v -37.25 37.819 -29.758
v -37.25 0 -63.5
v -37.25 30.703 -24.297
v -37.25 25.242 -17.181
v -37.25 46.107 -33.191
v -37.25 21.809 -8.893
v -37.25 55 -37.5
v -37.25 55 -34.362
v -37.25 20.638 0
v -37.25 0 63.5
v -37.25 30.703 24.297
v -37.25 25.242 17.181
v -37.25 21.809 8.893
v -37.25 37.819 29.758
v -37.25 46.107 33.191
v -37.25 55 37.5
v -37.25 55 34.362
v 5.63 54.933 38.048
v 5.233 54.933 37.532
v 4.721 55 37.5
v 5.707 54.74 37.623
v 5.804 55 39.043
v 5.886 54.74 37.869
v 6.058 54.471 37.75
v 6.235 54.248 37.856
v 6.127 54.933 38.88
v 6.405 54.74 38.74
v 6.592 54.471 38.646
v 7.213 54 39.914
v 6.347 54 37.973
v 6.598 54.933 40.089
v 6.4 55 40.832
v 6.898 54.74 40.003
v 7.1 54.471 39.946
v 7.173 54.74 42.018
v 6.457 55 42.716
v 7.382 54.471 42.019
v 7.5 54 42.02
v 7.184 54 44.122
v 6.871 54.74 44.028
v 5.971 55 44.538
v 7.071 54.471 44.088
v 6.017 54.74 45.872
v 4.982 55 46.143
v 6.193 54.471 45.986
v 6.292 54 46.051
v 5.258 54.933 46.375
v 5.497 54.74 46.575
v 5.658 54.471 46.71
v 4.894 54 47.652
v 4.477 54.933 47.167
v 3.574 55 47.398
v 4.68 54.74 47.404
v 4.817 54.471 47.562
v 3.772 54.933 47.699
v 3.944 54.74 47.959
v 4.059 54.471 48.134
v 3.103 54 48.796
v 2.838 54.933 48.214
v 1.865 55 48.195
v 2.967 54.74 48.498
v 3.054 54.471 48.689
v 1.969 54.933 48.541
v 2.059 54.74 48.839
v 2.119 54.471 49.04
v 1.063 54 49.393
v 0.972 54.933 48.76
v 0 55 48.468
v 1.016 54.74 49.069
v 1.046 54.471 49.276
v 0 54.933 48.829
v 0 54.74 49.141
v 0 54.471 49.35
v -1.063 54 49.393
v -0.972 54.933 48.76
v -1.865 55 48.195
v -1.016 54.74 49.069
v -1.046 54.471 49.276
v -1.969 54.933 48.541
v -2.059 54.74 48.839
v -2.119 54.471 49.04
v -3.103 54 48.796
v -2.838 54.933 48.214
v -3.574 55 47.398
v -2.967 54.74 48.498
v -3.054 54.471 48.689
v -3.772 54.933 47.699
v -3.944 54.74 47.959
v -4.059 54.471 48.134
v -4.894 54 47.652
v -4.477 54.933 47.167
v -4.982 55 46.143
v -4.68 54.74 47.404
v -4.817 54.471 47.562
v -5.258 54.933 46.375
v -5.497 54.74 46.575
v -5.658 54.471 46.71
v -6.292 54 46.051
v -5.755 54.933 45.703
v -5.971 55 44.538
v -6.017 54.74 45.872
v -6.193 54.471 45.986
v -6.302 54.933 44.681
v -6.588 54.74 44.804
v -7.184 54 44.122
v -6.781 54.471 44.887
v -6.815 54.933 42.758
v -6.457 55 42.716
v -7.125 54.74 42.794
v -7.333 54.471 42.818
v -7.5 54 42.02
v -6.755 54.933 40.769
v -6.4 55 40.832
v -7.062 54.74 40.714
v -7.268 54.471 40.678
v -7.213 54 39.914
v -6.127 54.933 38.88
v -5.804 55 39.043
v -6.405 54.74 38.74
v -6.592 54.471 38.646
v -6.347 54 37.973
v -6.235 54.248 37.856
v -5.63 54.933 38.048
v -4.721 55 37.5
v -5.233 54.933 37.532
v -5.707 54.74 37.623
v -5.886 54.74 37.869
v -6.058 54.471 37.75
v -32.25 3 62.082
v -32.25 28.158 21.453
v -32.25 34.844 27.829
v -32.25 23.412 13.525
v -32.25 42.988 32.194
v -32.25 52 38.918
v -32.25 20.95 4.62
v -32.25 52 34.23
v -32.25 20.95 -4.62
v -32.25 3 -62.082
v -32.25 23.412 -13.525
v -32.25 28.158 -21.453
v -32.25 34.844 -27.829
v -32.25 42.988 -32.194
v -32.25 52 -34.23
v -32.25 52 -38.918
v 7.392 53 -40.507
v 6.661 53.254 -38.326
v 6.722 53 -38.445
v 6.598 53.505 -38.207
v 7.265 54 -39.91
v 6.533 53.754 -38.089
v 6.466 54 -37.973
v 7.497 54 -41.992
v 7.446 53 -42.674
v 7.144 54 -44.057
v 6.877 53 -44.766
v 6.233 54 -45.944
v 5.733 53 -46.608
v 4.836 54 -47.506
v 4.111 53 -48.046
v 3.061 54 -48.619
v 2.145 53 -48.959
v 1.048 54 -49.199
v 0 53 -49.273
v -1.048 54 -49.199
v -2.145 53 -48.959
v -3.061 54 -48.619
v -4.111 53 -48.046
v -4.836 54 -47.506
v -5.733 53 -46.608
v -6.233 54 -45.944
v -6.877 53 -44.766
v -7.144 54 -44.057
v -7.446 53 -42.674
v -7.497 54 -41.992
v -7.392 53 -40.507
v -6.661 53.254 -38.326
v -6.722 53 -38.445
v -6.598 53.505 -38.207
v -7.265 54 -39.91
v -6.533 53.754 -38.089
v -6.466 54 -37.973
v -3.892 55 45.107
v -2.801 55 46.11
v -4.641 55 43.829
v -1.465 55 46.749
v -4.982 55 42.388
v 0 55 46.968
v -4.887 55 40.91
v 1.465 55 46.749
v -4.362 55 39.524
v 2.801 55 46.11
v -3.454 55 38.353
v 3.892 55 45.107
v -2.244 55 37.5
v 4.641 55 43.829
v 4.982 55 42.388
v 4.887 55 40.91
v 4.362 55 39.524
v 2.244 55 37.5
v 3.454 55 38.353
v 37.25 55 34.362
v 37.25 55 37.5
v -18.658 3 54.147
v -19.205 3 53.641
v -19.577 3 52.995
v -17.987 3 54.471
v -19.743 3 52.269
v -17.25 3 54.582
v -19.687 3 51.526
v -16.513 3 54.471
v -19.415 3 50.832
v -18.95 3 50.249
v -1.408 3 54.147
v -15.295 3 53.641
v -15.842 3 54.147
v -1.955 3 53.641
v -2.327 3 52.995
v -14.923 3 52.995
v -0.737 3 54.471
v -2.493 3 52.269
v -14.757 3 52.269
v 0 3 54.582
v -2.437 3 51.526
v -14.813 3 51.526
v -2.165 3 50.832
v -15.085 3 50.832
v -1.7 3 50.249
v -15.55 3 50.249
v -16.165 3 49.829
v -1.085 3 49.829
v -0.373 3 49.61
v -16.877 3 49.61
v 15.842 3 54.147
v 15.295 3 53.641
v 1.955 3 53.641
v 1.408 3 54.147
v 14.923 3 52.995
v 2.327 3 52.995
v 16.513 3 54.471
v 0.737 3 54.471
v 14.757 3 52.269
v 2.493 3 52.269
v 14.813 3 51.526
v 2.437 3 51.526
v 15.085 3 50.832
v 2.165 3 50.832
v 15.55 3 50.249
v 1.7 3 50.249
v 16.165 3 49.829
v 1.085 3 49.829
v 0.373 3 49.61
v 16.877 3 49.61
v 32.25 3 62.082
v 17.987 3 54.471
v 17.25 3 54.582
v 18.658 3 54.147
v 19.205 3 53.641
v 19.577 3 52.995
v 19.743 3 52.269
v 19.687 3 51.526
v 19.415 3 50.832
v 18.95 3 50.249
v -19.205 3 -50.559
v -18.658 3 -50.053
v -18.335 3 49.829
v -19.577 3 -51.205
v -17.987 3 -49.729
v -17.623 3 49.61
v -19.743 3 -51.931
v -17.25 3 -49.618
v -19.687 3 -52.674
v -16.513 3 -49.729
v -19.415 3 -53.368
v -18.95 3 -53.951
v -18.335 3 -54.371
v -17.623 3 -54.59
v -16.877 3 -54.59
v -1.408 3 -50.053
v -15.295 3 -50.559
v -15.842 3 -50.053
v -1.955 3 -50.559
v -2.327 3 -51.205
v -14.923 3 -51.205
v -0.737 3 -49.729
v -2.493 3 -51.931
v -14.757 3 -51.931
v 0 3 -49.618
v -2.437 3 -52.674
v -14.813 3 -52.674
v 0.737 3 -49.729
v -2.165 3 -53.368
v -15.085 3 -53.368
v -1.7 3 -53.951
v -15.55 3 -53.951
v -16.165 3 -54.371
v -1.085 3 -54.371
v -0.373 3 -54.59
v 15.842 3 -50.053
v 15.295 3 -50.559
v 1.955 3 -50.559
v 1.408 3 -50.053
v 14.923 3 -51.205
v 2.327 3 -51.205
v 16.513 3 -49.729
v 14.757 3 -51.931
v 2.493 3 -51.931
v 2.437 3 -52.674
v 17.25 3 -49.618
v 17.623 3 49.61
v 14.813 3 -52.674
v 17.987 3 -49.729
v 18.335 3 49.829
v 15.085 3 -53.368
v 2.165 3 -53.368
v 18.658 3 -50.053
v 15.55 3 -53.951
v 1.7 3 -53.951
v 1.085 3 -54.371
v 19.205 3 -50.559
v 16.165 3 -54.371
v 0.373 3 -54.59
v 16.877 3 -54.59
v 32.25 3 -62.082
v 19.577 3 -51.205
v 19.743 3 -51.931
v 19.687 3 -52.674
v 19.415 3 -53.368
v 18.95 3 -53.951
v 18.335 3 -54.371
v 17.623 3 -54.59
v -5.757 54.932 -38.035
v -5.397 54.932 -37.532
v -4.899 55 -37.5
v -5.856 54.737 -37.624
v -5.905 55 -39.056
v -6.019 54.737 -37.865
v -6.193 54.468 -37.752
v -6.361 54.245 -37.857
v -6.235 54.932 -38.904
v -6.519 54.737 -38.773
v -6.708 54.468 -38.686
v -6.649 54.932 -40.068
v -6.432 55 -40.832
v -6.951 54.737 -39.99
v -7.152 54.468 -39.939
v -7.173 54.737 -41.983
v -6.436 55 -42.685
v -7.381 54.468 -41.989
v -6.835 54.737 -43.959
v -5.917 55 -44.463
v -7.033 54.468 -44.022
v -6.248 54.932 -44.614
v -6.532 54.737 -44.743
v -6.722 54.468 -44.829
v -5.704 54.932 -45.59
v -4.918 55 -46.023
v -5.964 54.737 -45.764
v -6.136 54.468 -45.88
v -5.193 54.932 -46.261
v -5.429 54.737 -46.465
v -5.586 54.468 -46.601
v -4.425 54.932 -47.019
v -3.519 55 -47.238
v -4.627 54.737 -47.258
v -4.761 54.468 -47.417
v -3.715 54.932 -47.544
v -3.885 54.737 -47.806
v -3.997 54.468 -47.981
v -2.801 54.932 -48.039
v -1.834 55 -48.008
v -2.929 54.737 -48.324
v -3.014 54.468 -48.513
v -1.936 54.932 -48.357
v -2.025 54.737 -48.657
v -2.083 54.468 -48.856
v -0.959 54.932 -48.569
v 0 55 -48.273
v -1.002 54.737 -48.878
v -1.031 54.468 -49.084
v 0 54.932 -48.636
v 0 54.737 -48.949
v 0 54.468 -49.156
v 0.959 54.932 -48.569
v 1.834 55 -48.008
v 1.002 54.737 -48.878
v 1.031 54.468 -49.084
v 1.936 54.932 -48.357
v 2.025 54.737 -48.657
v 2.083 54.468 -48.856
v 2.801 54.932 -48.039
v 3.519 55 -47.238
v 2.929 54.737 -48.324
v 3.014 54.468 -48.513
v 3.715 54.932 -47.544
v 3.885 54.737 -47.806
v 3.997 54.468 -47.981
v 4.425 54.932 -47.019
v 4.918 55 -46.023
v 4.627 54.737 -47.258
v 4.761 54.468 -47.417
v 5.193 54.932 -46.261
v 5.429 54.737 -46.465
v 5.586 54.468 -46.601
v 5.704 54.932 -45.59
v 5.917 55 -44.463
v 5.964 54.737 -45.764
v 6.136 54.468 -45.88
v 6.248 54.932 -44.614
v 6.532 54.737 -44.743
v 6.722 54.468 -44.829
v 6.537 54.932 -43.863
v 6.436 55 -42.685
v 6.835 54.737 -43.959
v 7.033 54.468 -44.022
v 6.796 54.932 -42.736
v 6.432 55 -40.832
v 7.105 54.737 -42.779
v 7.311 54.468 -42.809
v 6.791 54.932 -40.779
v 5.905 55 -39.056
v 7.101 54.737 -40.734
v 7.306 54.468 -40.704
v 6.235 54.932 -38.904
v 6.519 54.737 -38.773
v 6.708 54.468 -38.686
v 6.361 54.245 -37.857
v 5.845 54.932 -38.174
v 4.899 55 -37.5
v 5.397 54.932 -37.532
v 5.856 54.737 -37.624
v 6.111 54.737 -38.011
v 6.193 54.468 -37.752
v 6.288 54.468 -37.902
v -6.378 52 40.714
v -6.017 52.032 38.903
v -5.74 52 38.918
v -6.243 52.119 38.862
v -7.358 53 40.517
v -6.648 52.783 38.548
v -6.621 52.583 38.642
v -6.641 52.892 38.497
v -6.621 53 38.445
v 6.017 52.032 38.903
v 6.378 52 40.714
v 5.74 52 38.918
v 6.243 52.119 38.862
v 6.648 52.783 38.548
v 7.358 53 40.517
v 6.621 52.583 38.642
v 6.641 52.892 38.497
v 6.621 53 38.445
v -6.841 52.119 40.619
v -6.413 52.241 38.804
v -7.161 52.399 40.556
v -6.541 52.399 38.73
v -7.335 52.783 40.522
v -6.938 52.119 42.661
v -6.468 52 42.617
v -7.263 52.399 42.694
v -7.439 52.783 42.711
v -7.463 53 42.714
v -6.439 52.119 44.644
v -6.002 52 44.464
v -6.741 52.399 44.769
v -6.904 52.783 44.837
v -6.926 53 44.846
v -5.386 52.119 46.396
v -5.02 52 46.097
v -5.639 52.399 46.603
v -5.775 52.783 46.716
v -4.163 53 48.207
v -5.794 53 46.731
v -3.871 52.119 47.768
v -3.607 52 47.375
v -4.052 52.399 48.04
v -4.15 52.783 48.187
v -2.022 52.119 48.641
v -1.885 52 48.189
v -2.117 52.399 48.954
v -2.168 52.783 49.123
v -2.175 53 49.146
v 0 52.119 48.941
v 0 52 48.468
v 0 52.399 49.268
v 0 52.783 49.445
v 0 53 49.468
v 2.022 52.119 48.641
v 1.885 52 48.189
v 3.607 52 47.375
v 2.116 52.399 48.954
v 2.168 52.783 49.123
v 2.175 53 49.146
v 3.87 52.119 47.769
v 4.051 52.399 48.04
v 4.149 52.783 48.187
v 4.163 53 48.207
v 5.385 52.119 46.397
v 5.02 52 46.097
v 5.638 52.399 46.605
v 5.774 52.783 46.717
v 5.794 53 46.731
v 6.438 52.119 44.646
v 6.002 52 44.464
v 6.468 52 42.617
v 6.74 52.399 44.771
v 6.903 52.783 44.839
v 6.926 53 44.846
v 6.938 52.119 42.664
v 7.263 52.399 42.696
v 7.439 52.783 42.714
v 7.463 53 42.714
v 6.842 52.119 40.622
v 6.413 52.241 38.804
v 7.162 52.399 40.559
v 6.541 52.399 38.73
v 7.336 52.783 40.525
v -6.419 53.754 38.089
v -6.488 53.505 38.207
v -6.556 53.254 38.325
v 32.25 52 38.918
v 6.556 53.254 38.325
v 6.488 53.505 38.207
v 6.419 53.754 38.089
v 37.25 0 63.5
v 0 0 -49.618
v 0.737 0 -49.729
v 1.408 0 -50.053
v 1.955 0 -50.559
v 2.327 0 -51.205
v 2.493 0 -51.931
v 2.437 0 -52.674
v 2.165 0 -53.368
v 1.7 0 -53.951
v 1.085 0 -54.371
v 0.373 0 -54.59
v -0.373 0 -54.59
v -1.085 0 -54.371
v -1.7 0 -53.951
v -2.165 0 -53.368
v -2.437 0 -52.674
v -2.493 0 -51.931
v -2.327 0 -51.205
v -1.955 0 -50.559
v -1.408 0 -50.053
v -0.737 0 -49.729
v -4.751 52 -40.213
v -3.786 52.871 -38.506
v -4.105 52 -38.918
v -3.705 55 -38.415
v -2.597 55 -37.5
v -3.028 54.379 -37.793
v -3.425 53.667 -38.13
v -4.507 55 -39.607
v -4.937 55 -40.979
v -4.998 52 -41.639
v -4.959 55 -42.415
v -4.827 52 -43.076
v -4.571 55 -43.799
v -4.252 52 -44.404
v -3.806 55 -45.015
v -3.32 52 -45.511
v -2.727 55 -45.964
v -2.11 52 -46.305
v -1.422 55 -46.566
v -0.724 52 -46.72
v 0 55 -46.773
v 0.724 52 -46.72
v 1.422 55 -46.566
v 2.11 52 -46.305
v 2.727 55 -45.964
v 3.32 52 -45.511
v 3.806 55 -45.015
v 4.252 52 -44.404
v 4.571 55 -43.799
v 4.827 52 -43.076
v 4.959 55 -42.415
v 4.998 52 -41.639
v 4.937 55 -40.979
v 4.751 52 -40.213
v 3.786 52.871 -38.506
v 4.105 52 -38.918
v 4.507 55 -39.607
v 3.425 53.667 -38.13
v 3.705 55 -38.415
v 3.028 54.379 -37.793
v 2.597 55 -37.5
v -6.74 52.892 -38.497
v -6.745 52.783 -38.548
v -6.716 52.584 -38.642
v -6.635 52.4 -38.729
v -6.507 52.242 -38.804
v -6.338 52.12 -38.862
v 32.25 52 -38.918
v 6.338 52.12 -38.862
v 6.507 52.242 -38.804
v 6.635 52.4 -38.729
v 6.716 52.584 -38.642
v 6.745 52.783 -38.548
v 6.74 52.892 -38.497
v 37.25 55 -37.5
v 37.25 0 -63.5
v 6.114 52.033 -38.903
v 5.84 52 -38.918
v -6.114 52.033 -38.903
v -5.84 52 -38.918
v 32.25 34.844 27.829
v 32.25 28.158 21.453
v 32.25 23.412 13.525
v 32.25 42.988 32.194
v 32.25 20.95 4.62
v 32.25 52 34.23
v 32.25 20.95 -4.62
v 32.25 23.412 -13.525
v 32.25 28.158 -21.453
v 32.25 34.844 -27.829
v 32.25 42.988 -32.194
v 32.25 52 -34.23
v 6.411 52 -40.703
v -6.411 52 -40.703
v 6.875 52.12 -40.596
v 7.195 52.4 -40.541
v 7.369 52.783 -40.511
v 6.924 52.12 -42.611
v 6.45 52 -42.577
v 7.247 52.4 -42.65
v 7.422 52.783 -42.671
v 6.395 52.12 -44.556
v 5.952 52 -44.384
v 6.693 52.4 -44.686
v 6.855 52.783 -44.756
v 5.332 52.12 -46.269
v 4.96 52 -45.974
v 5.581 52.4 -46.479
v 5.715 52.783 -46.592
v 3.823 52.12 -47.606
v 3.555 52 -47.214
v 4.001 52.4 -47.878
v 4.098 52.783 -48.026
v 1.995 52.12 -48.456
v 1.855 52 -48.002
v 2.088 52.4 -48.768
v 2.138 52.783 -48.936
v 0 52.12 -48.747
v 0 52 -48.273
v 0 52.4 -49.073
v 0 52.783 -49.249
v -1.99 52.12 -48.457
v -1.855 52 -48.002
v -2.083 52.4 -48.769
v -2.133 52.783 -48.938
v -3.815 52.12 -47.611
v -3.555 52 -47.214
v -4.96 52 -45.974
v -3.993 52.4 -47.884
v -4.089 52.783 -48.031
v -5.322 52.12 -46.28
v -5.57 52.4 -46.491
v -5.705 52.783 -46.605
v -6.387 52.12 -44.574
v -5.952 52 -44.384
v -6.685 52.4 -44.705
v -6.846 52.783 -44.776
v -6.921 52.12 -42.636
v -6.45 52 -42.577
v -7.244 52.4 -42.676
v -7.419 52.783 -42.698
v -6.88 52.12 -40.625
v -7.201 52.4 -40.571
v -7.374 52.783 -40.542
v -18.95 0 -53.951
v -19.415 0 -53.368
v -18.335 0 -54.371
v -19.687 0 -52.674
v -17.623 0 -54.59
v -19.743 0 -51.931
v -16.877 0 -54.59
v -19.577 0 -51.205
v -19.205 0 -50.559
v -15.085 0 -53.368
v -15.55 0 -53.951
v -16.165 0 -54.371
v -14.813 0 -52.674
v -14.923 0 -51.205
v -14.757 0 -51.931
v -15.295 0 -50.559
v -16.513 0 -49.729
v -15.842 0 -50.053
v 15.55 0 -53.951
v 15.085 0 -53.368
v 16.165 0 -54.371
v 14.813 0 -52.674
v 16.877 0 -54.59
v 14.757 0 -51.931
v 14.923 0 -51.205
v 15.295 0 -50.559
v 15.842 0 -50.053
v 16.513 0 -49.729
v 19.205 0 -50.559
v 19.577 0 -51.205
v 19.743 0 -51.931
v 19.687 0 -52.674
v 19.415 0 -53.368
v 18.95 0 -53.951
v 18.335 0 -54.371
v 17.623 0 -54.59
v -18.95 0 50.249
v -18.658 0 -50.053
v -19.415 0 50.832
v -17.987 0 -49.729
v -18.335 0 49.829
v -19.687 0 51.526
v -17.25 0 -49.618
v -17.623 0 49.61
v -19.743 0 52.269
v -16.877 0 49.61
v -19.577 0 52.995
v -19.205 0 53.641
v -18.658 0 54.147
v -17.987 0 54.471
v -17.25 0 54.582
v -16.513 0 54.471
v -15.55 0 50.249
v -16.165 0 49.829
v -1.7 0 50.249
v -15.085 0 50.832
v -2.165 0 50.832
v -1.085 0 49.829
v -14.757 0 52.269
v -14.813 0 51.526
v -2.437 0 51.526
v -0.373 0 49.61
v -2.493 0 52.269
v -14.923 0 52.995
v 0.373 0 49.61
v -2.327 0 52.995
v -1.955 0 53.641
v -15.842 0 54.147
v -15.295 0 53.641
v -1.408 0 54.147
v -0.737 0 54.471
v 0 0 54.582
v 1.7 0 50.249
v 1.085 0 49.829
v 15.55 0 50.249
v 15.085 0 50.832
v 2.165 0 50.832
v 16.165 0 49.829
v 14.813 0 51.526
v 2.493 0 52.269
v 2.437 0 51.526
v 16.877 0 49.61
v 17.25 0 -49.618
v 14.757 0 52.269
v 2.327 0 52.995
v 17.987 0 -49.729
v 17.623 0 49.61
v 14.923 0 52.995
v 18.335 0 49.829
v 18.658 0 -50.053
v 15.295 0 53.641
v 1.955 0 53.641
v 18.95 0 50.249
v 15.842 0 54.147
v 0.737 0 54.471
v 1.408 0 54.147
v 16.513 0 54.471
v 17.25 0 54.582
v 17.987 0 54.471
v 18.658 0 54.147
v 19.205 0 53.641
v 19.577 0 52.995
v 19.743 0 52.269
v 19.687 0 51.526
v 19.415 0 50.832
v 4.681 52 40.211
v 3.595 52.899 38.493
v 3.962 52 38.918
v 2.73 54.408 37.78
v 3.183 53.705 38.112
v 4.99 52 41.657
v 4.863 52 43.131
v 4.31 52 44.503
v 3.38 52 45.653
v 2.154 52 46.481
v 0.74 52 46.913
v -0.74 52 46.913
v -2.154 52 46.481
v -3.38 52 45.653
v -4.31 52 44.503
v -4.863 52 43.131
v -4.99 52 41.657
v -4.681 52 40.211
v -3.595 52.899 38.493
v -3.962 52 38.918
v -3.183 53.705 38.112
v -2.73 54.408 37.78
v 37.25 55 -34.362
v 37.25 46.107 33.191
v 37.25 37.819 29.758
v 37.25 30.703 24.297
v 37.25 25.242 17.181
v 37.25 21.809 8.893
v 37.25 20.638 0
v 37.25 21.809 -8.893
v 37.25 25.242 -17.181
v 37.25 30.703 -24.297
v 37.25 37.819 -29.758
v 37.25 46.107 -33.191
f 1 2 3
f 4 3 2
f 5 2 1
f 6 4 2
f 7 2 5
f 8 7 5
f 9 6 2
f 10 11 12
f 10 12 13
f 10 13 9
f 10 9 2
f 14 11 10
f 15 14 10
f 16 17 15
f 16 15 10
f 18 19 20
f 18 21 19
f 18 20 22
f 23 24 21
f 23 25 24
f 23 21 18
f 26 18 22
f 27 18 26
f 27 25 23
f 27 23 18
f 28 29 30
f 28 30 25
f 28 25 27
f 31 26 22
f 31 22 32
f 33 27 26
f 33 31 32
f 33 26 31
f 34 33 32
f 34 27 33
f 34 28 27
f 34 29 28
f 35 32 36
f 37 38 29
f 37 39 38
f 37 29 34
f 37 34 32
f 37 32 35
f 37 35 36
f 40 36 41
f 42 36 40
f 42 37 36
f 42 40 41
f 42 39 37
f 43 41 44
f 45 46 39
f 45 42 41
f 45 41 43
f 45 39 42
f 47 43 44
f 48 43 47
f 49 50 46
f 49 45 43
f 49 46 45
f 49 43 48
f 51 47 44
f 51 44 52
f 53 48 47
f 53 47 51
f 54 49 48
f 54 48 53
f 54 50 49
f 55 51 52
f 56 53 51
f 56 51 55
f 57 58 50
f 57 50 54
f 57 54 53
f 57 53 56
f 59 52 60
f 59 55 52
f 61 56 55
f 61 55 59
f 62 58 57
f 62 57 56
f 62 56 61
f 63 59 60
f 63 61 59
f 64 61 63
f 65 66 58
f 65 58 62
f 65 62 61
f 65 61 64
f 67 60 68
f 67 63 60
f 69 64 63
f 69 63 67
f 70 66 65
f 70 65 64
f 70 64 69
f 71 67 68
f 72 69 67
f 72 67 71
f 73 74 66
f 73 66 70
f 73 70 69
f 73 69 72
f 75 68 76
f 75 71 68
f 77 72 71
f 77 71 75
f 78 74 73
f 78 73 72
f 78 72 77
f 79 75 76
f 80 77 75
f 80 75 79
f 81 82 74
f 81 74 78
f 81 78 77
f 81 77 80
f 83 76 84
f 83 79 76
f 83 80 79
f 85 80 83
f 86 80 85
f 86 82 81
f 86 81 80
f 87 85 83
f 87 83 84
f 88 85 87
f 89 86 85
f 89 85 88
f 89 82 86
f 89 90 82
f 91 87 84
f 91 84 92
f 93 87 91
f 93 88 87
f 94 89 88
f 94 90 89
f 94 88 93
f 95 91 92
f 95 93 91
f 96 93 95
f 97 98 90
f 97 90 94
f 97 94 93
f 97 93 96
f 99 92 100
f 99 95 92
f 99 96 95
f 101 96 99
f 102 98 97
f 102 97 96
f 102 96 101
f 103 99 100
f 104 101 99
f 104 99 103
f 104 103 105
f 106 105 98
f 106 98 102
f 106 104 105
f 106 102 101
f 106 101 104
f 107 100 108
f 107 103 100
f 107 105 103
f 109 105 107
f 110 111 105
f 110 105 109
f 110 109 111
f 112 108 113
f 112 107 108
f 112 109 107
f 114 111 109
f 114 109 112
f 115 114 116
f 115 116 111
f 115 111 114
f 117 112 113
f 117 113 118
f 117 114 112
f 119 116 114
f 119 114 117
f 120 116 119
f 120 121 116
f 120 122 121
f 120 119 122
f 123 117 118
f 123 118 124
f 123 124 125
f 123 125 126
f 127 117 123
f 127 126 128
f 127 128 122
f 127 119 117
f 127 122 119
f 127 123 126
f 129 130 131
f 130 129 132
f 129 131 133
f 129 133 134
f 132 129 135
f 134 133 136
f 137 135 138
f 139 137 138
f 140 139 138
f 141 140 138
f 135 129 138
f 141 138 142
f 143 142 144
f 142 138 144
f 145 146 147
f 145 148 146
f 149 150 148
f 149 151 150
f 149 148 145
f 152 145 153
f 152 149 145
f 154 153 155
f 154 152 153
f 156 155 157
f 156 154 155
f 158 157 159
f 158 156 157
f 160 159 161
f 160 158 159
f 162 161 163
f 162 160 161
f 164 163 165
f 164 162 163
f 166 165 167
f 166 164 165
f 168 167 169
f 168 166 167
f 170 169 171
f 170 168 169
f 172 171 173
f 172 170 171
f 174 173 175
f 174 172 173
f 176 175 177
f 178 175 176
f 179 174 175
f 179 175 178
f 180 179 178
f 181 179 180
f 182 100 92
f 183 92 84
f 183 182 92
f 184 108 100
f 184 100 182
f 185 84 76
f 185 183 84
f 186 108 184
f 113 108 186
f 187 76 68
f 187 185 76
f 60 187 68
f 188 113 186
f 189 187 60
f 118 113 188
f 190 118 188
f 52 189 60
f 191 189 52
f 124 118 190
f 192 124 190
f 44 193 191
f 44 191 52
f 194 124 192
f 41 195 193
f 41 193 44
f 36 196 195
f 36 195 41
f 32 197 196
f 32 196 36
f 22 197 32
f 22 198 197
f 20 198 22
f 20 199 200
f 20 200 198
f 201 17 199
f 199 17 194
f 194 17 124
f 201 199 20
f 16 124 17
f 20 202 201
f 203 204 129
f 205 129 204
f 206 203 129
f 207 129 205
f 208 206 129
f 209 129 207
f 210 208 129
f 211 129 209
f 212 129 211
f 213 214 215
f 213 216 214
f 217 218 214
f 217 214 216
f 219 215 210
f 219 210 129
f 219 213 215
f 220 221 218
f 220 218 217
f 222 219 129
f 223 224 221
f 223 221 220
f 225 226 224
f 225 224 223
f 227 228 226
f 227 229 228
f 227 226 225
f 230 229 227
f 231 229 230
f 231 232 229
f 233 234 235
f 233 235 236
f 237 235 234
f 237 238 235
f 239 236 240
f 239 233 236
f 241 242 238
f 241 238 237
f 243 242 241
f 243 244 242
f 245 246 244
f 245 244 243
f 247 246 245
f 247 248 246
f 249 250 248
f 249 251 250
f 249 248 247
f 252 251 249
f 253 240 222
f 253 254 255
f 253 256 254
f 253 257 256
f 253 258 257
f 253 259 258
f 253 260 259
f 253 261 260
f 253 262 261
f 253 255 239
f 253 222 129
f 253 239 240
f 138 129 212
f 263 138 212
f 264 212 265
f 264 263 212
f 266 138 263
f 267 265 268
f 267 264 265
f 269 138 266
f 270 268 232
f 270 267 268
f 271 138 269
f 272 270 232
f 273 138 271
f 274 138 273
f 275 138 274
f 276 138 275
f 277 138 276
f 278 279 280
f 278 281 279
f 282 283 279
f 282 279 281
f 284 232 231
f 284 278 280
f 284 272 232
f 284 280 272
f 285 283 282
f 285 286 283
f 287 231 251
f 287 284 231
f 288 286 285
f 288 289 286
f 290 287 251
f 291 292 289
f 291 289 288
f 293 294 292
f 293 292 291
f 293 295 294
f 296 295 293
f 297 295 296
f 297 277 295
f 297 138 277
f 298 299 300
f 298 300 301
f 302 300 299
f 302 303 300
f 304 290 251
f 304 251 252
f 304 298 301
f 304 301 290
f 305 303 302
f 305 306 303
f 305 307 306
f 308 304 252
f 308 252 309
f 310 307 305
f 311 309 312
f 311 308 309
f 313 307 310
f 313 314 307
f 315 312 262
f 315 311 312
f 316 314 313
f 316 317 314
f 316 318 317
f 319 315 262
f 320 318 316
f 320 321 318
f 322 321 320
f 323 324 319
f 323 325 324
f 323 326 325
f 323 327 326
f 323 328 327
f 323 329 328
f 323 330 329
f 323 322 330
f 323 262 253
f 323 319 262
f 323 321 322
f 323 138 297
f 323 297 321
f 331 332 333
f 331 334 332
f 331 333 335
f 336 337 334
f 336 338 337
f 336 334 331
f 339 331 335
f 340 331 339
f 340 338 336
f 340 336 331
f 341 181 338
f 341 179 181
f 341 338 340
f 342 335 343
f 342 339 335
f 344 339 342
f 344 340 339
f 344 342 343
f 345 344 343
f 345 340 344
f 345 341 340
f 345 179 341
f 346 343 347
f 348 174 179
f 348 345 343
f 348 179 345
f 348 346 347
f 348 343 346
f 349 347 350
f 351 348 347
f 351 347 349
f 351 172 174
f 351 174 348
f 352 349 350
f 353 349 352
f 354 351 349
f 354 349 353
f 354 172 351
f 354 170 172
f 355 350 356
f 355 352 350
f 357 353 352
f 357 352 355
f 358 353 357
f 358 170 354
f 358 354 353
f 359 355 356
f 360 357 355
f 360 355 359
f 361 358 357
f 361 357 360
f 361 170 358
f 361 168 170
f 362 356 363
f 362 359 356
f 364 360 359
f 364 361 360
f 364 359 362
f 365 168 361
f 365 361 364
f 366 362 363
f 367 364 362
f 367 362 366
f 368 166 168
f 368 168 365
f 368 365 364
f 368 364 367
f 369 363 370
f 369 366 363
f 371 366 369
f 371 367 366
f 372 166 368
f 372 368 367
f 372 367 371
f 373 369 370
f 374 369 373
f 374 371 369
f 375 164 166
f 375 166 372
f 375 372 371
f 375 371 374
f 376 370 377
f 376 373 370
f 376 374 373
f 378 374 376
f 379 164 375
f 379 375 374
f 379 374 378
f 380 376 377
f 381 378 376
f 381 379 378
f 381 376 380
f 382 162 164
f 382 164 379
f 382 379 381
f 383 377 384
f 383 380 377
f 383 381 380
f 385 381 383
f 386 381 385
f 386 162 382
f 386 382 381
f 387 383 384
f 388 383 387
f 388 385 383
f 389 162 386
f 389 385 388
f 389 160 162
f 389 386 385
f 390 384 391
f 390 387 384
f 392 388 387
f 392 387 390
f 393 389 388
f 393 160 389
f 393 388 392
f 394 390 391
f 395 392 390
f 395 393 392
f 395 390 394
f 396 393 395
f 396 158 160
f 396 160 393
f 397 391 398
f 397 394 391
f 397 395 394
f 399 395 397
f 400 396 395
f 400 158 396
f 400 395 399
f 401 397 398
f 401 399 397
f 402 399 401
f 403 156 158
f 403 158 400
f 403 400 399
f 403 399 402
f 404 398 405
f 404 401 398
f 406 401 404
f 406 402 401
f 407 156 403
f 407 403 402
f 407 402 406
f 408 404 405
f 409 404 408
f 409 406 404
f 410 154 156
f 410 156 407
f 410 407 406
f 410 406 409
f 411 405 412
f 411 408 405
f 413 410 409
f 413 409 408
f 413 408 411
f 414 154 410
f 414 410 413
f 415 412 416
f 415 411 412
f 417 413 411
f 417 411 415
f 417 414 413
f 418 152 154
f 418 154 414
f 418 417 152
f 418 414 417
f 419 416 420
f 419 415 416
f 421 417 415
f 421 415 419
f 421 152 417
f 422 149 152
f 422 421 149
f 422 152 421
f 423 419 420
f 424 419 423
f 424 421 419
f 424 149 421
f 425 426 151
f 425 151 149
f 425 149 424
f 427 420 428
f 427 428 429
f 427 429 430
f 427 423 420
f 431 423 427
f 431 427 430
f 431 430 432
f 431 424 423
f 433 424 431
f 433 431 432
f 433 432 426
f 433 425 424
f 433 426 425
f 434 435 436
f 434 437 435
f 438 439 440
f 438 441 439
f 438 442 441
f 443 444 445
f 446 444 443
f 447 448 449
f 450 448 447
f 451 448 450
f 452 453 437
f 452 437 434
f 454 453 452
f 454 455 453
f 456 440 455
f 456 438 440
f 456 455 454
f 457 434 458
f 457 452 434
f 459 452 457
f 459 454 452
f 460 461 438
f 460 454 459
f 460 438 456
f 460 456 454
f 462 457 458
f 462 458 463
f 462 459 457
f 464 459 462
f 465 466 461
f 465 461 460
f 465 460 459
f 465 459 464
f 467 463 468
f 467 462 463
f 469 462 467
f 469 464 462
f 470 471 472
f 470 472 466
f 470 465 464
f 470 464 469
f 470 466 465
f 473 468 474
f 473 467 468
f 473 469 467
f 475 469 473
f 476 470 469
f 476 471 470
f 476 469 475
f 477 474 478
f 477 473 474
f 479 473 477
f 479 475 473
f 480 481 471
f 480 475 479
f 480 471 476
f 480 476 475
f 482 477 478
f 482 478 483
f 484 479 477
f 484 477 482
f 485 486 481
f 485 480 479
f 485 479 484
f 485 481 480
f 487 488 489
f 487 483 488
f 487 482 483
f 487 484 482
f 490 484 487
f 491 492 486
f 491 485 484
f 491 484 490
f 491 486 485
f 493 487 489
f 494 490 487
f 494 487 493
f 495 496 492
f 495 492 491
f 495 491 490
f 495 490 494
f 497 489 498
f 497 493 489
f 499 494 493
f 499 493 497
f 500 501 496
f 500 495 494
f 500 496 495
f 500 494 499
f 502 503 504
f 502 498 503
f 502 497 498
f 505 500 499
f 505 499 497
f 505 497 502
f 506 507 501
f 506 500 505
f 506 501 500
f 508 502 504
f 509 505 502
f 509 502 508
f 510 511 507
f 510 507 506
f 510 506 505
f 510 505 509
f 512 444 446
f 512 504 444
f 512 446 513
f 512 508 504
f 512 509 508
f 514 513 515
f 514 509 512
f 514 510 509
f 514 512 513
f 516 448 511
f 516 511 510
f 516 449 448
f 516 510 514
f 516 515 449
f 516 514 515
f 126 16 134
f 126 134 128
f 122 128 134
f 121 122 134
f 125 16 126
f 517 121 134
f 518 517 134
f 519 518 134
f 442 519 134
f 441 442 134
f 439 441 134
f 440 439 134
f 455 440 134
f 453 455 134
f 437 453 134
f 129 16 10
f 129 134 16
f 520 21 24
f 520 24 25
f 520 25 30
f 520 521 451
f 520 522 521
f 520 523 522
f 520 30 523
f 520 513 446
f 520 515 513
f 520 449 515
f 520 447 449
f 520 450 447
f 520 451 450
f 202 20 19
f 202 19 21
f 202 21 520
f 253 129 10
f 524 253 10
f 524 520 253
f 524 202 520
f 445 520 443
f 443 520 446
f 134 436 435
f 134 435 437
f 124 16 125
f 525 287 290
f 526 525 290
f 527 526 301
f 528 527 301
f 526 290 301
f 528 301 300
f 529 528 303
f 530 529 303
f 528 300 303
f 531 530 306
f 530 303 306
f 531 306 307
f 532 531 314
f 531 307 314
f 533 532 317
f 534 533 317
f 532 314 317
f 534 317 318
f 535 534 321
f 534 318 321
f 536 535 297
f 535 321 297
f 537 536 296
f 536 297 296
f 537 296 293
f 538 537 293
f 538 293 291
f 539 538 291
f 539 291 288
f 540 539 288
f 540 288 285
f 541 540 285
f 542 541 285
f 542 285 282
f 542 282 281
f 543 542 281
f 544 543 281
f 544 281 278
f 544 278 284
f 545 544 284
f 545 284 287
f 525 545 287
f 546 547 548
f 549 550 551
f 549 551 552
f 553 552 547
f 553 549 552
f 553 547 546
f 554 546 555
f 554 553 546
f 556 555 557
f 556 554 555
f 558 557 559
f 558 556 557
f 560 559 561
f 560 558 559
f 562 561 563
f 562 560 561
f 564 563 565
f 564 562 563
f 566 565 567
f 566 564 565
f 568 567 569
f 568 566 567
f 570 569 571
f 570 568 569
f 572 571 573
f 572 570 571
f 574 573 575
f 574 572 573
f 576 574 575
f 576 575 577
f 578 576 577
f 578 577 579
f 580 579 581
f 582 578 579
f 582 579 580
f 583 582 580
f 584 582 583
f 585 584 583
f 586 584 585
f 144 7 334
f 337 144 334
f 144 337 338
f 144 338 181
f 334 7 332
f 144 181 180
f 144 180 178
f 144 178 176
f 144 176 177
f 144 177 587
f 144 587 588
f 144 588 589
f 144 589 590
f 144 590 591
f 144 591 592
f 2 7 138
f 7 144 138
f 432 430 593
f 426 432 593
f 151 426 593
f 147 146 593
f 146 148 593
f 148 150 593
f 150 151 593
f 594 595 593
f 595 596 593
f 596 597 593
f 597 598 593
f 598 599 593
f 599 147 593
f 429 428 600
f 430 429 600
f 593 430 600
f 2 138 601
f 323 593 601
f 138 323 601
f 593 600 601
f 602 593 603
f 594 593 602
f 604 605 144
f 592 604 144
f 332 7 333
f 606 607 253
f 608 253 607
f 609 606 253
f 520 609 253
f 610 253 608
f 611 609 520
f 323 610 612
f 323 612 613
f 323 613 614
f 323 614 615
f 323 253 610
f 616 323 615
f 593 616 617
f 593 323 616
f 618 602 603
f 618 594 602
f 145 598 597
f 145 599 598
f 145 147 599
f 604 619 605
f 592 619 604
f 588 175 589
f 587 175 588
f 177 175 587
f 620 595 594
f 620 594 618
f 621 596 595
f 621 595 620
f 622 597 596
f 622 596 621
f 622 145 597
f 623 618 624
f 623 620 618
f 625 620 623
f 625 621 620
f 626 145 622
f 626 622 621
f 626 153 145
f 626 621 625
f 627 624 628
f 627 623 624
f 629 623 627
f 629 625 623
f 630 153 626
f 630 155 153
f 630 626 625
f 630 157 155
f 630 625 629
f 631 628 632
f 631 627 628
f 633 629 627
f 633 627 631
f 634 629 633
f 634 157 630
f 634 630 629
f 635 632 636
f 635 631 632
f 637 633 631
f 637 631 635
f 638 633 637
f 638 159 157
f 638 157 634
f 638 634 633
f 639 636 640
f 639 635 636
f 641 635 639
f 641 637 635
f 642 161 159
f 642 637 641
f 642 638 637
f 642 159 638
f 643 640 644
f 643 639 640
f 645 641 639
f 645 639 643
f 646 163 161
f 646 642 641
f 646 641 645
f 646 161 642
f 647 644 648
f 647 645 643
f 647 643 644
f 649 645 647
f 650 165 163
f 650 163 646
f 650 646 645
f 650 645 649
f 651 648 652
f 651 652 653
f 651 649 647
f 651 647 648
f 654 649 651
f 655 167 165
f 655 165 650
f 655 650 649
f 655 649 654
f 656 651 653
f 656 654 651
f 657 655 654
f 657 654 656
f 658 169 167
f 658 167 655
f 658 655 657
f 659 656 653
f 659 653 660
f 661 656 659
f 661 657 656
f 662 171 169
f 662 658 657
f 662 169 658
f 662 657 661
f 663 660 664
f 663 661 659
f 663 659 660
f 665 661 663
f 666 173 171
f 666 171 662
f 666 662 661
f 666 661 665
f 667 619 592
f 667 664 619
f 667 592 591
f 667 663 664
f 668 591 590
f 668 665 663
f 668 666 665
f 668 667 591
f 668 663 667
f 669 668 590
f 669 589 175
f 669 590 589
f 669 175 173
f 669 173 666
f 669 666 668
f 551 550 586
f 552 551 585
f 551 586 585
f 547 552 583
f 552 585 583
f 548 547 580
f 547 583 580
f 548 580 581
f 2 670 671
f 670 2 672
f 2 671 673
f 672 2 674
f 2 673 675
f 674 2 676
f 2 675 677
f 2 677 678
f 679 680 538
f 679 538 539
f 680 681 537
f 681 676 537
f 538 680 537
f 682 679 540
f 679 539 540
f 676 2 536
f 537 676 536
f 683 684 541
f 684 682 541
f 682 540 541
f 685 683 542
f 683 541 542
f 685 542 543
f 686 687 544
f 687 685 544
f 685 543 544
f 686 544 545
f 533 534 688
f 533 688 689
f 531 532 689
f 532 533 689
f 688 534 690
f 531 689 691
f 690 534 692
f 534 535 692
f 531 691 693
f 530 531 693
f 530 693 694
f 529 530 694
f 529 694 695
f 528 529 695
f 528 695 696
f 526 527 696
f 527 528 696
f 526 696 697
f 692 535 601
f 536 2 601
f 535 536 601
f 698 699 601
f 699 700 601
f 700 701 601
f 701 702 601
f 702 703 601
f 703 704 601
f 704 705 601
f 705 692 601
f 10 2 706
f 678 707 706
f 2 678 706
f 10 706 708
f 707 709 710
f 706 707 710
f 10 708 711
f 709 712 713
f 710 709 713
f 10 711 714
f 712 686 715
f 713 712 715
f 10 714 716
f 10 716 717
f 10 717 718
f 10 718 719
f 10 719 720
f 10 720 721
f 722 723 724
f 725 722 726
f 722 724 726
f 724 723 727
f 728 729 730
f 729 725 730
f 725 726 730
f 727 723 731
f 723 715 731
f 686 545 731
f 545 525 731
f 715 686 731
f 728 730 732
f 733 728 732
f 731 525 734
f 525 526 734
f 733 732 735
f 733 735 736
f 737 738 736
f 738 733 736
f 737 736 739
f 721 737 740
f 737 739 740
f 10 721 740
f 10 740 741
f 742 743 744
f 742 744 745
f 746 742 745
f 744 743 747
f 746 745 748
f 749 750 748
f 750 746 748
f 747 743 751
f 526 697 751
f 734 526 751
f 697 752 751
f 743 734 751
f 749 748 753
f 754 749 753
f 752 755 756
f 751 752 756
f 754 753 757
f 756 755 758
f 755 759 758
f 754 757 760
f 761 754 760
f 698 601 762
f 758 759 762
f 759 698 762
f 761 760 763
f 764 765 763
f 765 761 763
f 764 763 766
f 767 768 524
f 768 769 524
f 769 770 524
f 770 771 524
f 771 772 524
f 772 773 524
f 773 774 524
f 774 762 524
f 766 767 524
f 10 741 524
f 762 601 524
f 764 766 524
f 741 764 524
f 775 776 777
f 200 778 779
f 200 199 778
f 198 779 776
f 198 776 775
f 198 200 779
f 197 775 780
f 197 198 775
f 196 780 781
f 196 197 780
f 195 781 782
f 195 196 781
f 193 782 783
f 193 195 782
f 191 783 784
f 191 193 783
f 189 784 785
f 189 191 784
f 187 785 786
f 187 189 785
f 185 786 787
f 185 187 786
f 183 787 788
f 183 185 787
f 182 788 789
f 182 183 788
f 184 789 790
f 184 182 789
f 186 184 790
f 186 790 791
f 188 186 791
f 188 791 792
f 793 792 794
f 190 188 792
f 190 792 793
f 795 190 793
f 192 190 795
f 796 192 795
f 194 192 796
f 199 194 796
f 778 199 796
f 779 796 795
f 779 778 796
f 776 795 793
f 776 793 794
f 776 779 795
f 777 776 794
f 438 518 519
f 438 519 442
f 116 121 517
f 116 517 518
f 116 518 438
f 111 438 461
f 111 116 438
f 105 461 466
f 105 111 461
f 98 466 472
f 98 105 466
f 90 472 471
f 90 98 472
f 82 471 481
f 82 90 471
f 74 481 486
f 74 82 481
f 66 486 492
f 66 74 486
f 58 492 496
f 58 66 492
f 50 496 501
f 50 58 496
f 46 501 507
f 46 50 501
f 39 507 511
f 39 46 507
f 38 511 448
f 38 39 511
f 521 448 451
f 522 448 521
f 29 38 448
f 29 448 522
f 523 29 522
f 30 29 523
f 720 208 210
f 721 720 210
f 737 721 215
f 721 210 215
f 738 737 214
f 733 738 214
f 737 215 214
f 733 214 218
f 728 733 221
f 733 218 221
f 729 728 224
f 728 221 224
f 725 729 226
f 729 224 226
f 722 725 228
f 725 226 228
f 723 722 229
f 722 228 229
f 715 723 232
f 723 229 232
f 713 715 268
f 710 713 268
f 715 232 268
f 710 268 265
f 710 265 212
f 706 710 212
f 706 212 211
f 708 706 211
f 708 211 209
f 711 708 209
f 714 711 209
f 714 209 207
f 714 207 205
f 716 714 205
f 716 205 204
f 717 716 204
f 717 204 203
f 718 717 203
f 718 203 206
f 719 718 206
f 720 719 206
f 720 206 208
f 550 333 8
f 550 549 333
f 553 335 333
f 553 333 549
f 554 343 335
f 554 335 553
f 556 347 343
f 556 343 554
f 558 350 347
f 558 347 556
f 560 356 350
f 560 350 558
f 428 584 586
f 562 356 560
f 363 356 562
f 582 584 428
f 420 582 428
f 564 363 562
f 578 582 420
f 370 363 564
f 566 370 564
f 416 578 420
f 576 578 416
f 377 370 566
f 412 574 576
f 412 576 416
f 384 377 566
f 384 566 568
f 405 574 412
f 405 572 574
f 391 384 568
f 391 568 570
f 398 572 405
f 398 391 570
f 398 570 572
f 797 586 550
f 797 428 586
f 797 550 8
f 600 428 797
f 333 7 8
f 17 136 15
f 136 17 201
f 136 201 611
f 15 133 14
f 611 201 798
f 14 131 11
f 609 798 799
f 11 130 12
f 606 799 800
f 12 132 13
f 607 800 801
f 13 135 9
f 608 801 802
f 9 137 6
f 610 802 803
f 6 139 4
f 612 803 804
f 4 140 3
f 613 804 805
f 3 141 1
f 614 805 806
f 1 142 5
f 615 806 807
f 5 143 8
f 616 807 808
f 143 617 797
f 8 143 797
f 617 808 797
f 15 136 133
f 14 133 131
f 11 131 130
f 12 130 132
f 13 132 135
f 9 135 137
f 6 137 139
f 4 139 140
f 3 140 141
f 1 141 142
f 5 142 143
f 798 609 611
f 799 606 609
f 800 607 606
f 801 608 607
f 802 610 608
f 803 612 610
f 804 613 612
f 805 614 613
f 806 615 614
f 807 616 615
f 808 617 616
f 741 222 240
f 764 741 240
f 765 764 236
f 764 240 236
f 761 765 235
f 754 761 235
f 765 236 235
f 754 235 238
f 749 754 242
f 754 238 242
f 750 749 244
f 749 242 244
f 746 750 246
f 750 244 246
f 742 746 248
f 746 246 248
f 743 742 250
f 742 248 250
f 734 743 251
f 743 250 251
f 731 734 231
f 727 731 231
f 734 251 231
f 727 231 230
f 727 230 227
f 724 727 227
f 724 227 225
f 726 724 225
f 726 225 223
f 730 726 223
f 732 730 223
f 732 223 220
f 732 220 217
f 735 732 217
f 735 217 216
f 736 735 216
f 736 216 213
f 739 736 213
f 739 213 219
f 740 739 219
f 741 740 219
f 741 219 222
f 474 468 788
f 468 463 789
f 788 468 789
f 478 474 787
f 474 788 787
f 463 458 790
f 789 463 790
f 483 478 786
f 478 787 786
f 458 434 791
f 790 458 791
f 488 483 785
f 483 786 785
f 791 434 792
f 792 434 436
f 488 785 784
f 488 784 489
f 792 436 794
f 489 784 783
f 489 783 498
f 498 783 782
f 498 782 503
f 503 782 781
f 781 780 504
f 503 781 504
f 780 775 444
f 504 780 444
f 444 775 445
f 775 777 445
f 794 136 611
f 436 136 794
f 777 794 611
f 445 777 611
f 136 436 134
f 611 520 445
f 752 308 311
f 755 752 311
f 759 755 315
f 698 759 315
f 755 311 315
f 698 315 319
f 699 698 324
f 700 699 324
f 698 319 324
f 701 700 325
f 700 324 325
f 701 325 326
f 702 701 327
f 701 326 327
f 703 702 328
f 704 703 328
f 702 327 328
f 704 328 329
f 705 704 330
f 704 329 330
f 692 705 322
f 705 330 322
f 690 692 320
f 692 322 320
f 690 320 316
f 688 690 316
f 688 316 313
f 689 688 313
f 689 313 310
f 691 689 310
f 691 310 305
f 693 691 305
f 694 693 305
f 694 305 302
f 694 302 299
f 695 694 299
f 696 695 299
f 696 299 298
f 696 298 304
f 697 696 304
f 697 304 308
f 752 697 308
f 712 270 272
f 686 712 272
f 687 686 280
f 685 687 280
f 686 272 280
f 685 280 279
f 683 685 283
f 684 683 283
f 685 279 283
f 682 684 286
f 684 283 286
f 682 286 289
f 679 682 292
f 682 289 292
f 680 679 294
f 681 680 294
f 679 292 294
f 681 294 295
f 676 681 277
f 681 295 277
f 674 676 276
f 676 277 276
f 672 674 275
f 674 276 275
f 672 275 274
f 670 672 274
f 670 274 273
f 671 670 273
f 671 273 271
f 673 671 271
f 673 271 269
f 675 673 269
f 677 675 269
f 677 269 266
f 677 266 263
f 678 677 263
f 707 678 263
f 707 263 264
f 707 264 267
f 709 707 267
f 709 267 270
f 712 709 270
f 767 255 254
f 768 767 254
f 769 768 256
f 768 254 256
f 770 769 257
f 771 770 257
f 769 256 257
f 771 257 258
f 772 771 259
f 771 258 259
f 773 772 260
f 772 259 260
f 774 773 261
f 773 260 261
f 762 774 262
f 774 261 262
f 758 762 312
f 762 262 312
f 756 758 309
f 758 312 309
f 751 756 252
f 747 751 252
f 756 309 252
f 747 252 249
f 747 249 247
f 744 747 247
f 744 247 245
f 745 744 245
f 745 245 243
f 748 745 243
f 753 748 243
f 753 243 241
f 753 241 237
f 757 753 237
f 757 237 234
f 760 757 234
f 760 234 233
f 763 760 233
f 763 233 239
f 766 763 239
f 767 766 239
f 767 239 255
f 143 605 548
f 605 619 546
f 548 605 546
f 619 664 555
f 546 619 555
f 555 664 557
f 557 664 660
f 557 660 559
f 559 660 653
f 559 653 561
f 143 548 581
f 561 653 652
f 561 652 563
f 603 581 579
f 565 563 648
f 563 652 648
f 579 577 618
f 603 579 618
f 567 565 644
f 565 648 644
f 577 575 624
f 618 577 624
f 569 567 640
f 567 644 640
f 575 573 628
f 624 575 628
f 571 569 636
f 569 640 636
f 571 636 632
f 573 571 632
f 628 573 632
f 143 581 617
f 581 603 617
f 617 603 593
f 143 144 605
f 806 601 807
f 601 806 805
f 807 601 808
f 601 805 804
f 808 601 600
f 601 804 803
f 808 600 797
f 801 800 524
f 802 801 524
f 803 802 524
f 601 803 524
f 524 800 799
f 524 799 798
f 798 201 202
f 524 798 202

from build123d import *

# Parameters (mm, degrees)
SKETCH1_W               = 74.5
SKETCH1_H               = 75
BOSS_EXTRUDE1_DEPTH     = 55
SKETCH5_R               = 34.3615522135402
CUT_EXTRUDE2_DEPTH      = 100.90745717913153
BOSS_EXTRUDE3_DEPTH     = 74.5
BOSS_EXTRUDE4_DEPTH     = 74.5
CUT_EXTRUDE3_DEPTH      = 121.88656873284145
CUT_EXTRUDE3_DEPTH_BACK = 121.88656873284145
SKETCH9_W               = 64.5
SKETCH9_H               = 49.00000000000001
BOSS_EXTRUDE5_DEPTH     = 3
BOSS_EXTRUDE6_DEPTH     = 3
FILLET1_R               = 1
SKETCH12_R              = 2.499999999999999
SKETCH12_R_2            = 2.5000000000000027
SKETCH12_R_3            = 2.5000000000000018
CUT_EXTRUDE4_DEPTH      = 91.13219475054404
LPATTERN1_COUNT         = 2
LPATTERN1_PITCH         = 104.2


with BuildPart() as part:
    # Sketch1 → Boss-Extrude1 (new body)
    with BuildSketch(Plane(origin=(0, 0, 0), x_dir=(1, 0, 0), z_dir=(0, 1, 0))):
        Rectangle(SKETCH1_W, SKETCH1_H)
    extrude(amount=BOSS_EXTRUDE1_DEPTH)

    # Sketch5 → Cut-Extrude2 (cut, through all)
    with BuildSketch(Plane(origin=(37.25, 0, 0), x_dir=(0, 0, -1), z_dir=(1, 0, 0))):
        with Locations((6.94e-15, 55)):
            Circle(SKETCH5_R)
    extrude(amount=-CUT_EXTRUDE2_DEPTH, mode=Mode.SUBTRACT)

    # Sketch7 → Boss-Extrude3 (add)
    with BuildSketch(Plane(origin=(37.25, 0, 0), x_dir=(0, 0, -1), z_dir=(1, 0, 0))):
        Polygon((-37.49999999999999, 55), (-63.5, 0), (-37.49999999999999, 0), align=None)
    extrude(amount=-BOSS_EXTRUDE3_DEPTH)

    # Sketch8 → Boss-Extrude4 (add)
    with BuildSketch(Plane(origin=(37.25, 0, 0), x_dir=(0, 0, -1), z_dir=(1, 0, 0))):
        Polygon((37.50000000000001, 55), (63.5, -2.4e-16), (37.50000000000001, 0), align=None)
    extrude(amount=-BOSS_EXTRUDE4_DEPTH)

    # Sketch9 → Cut-Extrude3 (cut, two sides: drawn at the far end of the back side and taken through both)
    with BuildSketch(Plane.XY.offset(37.49999999999999).offset(-CUT_EXTRUDE3_DEPTH_BACK)):
        with Locations((0, 27.500000000000004)):
            Rectangle(SKETCH9_W, SKETCH9_H)
    extrude(amount=CUT_EXTRUDE3_DEPTH + CUT_EXTRUDE3_DEPTH_BACK, mode=Mode.SUBTRACT)

    # Sketch10 → Boss-Extrude5 (add)
    with BuildSketch(Plane(origin=(0, 55, 0), x_dir=(1, 0, 0), z_dir=(0, 1, 0))):
        with BuildLine():
            ThreePointArc((6.164042343036378, 37.499999999999844), (7.158223158465123, 39.534270662732936), (7.5, 41.77253812074898))
            ThreePointArc((7.5, 41.77253812074898), (-2.2382674580157964, 48.93076127921418), (-6.164042343036669, 37.50000000000026))
            Line((-6.164042343036755, 37.50000000000001), (-2.5971942566442934, 37.50000000000001))
            ThreePointArc((-2.5971942566443156, 37.499999999999936), (-2.4509211244732474, 46.1306323879271), (4.999999999999999, 41.77253812074898))
            ThreePointArc((4.999999999999999, 41.77253812074898), (4.358094267178168, 39.32161699627582), (2.5971942566444843, 37.50000000000004))
            Line((2.5971942566444923, 37.50000000000001), (6.164042343036321, 37.50000000000001))
        make_face()
    extrude(amount=-BOSS_EXTRUDE5_DEPTH)

    # Sketch11 → Boss-Extrude6 (add)
    with BuildSketch(Plane(origin=(0, 55, 0), x_dir=(1, 0, 0), z_dir=(0, 1, 0))):
        with BuildLine():
            ThreePointArc((-6.023640204727232, -37.49999999999989), (-2.3529448000904902, -49.08965777094965), (7.5, -41.96830601951038))
            ThreePointArc((7.5, -41.96830601951038), (7.121351751439286, -39.615361219419945), (6.023640204727302, -37.499999999999986))
            Line((6.0236402047273, -37.49999999999999), (2.2437115046296583, -37.49999999999999))
            ThreePointArc((2.243711504629653, -37.500000000000014), (4.255499825117389, -39.34328768844565), (4.999999999999999, -41.96830601951038))
            ThreePointArc((4.999999999999999, -41.96830601951038), (-2.6250183310647546, -46.223805844627755), (-2.2437115046296032, -37.49999999999999))
            Line((-2.2437115046296014, -37.49999999999999), (-6.023640204727201, -37.49999999999999))
        make_face()
        with BuildLine():
            Line((2.2437115046296583, -37.49999999999999), (6.0236402047273, -37.49999999999999))
            ThreePointArc((6.023640204727302, -37.499999999999986), (5.875e-14, -34.46830601951038), (-6.023640204727232, -37.49999999999989))
            Line((-6.023640204727201, -37.49999999999999), (-2.2437115046296014, -37.49999999999999))
            ThreePointArc((-2.2437115046296032, -37.49999999999999), (2.806e-14, -36.96830601951038), (2.243711504629653, -37.500000000000014))
        make_face()
    extrude(amount=-BOSS_EXTRUDE6_DEPTH)

    # Fillet1
    # the kernel refuses this fillet: 1 mm, written as the material it takes off along each edge
    with BuildSketch(Plane(origin=(-3.55e-15, 55, 41.96830601951038), x_dir=(1, 0, 0), z_dir=(0, 0, -1))) as fillet1_piece_1_section:
        with BuildLine():
            CenterArc((7.5 - FILLET1_R, FILLET1_R), FILLET1_R, 270, 90)
            Line((7.5, FILLET1_R), (7.5, 0))
            Line((7.5, 0), (7.5 - FILLET1_R, 0))
        make_face()
    fillet1_piece_1 = revolve(axis=Axis((-3.55e-15, 55, 41.96830601951038), (0, -1, 0)), revolution_arc=235.71091499042655, mode=Mode.PRIVATE)
    fillet1_piece_1 = split(fillet1_piece_1, bisect_by=Plane(origin=(-2.6713999236626833, 50.45322927533666, 39.6493825243863), z_dir=(0, 0.42737961689341636, 0.9040722665053036)), keep=Keep.TOP, mode=Mode.PRIVATE)
    add(fillet1_piece_1, mode=Mode.SUBTRACT)
    with BuildSketch(Plane(origin=(1.78e-15, 52, 41.96830601951038), x_dir=(-0.7297482724094352, 0, -0.6837159197469698), z_dir=(0.6837159197469698, 0, -0.7297482724094352))) as fillet1_piece_2_section:
        with BuildLine():
            CenterArc((7.500000000000202 - FILLET1_R, FILLET1_R), FILLET1_R, 270, 90)
            Line((7.500000000000198, FILLET1_R), (7.500000000000202, 0))
            Line((7.500000000000202, 0), (7.500000000000202 - FILLET1_R, 0))
        make_face()
    fillet1_piece_2 = revolve(axis=Axis((1.78e-15, 52, 41.96830601951038), (0, 1, 0)), revolution_arc=223.13470500677207, mode=Mode.PRIVATE)
    fillet1_piece_2 = split(fillet1_piece_2, bisect_by=Plane(origin=(-1.7477354157855842, 48.3431338081412, 40.64688219978779), z_dir=(0, 0.42737961689341636, 0.9040722665053036)), keep=Keep.TOP, mode=Mode.PRIVATE)
    add(fillet1_piece_2, mode=Mode.SUBTRACT)
    with BuildSketch(Plane(origin=(1.33e-15, 55, -41.772538120748976), x_dir=(-0.5894081060524027, 0, 0.8078354315822744), z_dir=(0.8078354315822744, 0, 0.5894081060524027))) as fillet1_piece_3_section:
        with BuildLine():
            CenterArc((7.500000000001482 - FILLET1_R, FILLET1_R), FILLET1_R, 270, 90)
            Line((7.500000000001481, FILLET1_R), (7.500000000001482, 0))
            Line((7.500000000001482, 0), (7.500000000001482 - FILLET1_R, 0))
        make_face()
    fillet1_piece_3 = revolve(axis=Axis((1.33e-15, 55, -41.772538120748976), (0, -1, 0)), revolution_arc=287.7699662913145, mode=Mode.PRIVATE)
    fillet1_piece_3 = split(fillet1_piece_3, bisect_by=Plane(origin=(0, 50.33119352274253, -39.70707215288535), z_dir=(0, 0.42737961689341614, -0.9040722665053037)), keep=Keep.TOP, mode=Mode.PRIVATE)
    add(fillet1_piece_3, mode=Mode.SUBTRACT)
    with BuildSketch(Plane(origin=(5.33e-15, 52, -41.77253812074899), x_dir=(0.7487686990913793, 0, 0.662831377697981), z_dir=(-0.662831377697981, 0, 0.7487686990913793))) as fillet1_piece_4_section:
        with BuildLine():
            CenterArc((7.499999999999997 - FILLET1_R, FILLET1_R), FILLET1_R, 269.9999999999997, 90.00000000000028)
            Line((7.499999999999997 - FILLET1_R, 0), (7.499999999999997, 0))
            Line((7.499999999999997, 0), (7.499999999999996, FILLET1_R))
        make_face()
    fillet1_piece_4 = revolve(axis=Axis((5.33e-15, 52, -41.77253812074899), (0, 1, 0)), revolution_arc=263.03233782444397, mode=Mode.PRIVATE)
    fillet1_piece_4 = split(fillet1_piece_4, bisect_by=Plane(origin=(7.11e-15, 48.33525291032238, -40.65060771512034), z_dir=(0, 0.42737961689341614, -0.9040722665053037)), keep=Keep.TOP, mode=Mode.PRIVATE)
    add(fillet1_piece_4, mode=Mode.SUBTRACT)
    with BuildSketch(Plane(origin=(1.78e-15, 52, 41.96830601951038), x_dir=(1, 0, 0), z_dir=(0, 0, 1))) as fillet1_piece_5_section:
        with BuildLine():
            CenterArc((7.499999999999997 - FILLET1_R, FILLET1_R), FILLET1_R, 270, 90)
            Line((7.499999999999998, FILLET1_R), (7.499999999999997, 0))
            Line((7.499999999999997, 0), (7.499999999999997 - FILLET1_R, 0))
        make_face()
    fillet1_piece_5 = revolve(axis=Axis((1.78e-15, 52, 41.96830601951038), (0, 1, 0)), revolution_arc=43.0957883273494, mode=Mode.PRIVATE)
    fillet1_piece_5 = split(fillet1_piece_5, bisect_by=Plane(origin=(7.034955474041542, 51.63351194574045, 39.09143071655905), z_dir=(0, 0.42737961689341636, 0.9040722665053036)), keep=Keep.TOP, mode=Mode.PRIVATE)
    add(fillet1_piece_5, mode=Mode.SUBTRACT)
    with BuildSketch(Plane(origin=(-3.55e-15, 55, 41.96830601951038), x_dir=(0.563991699397745, 0, -0.825780456907551), z_dir=(-0.825780456907551, 0, -0.563991699397745))) as fillet1_piece_6_section:
        with BuildLine():
            CenterArc((7.499999999999998 - FILLET1_R, FILLET1_R), FILLET1_R, 270, 90)
            Line((7.499999999999998, FILLET1_R), (7.499999999999998, 0))
            Line((7.499999999999998, 0), (7.499999999999998 - FILLET1_R, 0))
        make_face()
    fillet1_piece_6 = revolve(axis=Axis((-3.55e-15, 55, 41.96830601951038), (0, -1, 0)), revolution_arc=55.66769762264099, mode=Mode.PRIVATE)
    fillet1_piece_6 = split(fillet1_piece_6, bisect_by=Plane(origin=(6.774695529731854, 53.96765158354673, 37.988019251414265), z_dir=(0, 0.42737961689341636, 0.9040722665053036)), keep=Keep.TOP, mode=Mode.PRIVATE)
    add(fillet1_piece_6, mode=Mode.SUBTRACT)

    # Sketch12 → Cut-Extrude4 (cut, through all)
    with BuildSketch(Plane(origin=(0, 3, 0), x_dir=(1, 0, 0), z_dir=(0, 1, 0))):
        with Locations(Location((-17.25, -52.08181818181816, 0), (0, 0, 270))):
            Circle(SKETCH12_R)
        with Locations(Location((17.25, -52.081818181818164, 0), (0, 0, 270))):
            Circle(SKETCH12_R_2)
        with Locations(Location((0, -52.081818181818164, 0), (0, 0, 270))):
            Circle(SKETCH12_R_3)
    cut_extrude4 = extrude(amount=-CUT_EXTRUDE4_DEPTH, mode=Mode.SUBTRACT)

    # LPattern1: Cut-Extrude4 ×2
    with Locations(*[(0, 0, -i * LPATTERN1_PITCH) for i in range(1, LPATTERN1_COUNT)]):
        add(cut_extrude4, mode=Mode.SUBTRACT)


solid = part.part
